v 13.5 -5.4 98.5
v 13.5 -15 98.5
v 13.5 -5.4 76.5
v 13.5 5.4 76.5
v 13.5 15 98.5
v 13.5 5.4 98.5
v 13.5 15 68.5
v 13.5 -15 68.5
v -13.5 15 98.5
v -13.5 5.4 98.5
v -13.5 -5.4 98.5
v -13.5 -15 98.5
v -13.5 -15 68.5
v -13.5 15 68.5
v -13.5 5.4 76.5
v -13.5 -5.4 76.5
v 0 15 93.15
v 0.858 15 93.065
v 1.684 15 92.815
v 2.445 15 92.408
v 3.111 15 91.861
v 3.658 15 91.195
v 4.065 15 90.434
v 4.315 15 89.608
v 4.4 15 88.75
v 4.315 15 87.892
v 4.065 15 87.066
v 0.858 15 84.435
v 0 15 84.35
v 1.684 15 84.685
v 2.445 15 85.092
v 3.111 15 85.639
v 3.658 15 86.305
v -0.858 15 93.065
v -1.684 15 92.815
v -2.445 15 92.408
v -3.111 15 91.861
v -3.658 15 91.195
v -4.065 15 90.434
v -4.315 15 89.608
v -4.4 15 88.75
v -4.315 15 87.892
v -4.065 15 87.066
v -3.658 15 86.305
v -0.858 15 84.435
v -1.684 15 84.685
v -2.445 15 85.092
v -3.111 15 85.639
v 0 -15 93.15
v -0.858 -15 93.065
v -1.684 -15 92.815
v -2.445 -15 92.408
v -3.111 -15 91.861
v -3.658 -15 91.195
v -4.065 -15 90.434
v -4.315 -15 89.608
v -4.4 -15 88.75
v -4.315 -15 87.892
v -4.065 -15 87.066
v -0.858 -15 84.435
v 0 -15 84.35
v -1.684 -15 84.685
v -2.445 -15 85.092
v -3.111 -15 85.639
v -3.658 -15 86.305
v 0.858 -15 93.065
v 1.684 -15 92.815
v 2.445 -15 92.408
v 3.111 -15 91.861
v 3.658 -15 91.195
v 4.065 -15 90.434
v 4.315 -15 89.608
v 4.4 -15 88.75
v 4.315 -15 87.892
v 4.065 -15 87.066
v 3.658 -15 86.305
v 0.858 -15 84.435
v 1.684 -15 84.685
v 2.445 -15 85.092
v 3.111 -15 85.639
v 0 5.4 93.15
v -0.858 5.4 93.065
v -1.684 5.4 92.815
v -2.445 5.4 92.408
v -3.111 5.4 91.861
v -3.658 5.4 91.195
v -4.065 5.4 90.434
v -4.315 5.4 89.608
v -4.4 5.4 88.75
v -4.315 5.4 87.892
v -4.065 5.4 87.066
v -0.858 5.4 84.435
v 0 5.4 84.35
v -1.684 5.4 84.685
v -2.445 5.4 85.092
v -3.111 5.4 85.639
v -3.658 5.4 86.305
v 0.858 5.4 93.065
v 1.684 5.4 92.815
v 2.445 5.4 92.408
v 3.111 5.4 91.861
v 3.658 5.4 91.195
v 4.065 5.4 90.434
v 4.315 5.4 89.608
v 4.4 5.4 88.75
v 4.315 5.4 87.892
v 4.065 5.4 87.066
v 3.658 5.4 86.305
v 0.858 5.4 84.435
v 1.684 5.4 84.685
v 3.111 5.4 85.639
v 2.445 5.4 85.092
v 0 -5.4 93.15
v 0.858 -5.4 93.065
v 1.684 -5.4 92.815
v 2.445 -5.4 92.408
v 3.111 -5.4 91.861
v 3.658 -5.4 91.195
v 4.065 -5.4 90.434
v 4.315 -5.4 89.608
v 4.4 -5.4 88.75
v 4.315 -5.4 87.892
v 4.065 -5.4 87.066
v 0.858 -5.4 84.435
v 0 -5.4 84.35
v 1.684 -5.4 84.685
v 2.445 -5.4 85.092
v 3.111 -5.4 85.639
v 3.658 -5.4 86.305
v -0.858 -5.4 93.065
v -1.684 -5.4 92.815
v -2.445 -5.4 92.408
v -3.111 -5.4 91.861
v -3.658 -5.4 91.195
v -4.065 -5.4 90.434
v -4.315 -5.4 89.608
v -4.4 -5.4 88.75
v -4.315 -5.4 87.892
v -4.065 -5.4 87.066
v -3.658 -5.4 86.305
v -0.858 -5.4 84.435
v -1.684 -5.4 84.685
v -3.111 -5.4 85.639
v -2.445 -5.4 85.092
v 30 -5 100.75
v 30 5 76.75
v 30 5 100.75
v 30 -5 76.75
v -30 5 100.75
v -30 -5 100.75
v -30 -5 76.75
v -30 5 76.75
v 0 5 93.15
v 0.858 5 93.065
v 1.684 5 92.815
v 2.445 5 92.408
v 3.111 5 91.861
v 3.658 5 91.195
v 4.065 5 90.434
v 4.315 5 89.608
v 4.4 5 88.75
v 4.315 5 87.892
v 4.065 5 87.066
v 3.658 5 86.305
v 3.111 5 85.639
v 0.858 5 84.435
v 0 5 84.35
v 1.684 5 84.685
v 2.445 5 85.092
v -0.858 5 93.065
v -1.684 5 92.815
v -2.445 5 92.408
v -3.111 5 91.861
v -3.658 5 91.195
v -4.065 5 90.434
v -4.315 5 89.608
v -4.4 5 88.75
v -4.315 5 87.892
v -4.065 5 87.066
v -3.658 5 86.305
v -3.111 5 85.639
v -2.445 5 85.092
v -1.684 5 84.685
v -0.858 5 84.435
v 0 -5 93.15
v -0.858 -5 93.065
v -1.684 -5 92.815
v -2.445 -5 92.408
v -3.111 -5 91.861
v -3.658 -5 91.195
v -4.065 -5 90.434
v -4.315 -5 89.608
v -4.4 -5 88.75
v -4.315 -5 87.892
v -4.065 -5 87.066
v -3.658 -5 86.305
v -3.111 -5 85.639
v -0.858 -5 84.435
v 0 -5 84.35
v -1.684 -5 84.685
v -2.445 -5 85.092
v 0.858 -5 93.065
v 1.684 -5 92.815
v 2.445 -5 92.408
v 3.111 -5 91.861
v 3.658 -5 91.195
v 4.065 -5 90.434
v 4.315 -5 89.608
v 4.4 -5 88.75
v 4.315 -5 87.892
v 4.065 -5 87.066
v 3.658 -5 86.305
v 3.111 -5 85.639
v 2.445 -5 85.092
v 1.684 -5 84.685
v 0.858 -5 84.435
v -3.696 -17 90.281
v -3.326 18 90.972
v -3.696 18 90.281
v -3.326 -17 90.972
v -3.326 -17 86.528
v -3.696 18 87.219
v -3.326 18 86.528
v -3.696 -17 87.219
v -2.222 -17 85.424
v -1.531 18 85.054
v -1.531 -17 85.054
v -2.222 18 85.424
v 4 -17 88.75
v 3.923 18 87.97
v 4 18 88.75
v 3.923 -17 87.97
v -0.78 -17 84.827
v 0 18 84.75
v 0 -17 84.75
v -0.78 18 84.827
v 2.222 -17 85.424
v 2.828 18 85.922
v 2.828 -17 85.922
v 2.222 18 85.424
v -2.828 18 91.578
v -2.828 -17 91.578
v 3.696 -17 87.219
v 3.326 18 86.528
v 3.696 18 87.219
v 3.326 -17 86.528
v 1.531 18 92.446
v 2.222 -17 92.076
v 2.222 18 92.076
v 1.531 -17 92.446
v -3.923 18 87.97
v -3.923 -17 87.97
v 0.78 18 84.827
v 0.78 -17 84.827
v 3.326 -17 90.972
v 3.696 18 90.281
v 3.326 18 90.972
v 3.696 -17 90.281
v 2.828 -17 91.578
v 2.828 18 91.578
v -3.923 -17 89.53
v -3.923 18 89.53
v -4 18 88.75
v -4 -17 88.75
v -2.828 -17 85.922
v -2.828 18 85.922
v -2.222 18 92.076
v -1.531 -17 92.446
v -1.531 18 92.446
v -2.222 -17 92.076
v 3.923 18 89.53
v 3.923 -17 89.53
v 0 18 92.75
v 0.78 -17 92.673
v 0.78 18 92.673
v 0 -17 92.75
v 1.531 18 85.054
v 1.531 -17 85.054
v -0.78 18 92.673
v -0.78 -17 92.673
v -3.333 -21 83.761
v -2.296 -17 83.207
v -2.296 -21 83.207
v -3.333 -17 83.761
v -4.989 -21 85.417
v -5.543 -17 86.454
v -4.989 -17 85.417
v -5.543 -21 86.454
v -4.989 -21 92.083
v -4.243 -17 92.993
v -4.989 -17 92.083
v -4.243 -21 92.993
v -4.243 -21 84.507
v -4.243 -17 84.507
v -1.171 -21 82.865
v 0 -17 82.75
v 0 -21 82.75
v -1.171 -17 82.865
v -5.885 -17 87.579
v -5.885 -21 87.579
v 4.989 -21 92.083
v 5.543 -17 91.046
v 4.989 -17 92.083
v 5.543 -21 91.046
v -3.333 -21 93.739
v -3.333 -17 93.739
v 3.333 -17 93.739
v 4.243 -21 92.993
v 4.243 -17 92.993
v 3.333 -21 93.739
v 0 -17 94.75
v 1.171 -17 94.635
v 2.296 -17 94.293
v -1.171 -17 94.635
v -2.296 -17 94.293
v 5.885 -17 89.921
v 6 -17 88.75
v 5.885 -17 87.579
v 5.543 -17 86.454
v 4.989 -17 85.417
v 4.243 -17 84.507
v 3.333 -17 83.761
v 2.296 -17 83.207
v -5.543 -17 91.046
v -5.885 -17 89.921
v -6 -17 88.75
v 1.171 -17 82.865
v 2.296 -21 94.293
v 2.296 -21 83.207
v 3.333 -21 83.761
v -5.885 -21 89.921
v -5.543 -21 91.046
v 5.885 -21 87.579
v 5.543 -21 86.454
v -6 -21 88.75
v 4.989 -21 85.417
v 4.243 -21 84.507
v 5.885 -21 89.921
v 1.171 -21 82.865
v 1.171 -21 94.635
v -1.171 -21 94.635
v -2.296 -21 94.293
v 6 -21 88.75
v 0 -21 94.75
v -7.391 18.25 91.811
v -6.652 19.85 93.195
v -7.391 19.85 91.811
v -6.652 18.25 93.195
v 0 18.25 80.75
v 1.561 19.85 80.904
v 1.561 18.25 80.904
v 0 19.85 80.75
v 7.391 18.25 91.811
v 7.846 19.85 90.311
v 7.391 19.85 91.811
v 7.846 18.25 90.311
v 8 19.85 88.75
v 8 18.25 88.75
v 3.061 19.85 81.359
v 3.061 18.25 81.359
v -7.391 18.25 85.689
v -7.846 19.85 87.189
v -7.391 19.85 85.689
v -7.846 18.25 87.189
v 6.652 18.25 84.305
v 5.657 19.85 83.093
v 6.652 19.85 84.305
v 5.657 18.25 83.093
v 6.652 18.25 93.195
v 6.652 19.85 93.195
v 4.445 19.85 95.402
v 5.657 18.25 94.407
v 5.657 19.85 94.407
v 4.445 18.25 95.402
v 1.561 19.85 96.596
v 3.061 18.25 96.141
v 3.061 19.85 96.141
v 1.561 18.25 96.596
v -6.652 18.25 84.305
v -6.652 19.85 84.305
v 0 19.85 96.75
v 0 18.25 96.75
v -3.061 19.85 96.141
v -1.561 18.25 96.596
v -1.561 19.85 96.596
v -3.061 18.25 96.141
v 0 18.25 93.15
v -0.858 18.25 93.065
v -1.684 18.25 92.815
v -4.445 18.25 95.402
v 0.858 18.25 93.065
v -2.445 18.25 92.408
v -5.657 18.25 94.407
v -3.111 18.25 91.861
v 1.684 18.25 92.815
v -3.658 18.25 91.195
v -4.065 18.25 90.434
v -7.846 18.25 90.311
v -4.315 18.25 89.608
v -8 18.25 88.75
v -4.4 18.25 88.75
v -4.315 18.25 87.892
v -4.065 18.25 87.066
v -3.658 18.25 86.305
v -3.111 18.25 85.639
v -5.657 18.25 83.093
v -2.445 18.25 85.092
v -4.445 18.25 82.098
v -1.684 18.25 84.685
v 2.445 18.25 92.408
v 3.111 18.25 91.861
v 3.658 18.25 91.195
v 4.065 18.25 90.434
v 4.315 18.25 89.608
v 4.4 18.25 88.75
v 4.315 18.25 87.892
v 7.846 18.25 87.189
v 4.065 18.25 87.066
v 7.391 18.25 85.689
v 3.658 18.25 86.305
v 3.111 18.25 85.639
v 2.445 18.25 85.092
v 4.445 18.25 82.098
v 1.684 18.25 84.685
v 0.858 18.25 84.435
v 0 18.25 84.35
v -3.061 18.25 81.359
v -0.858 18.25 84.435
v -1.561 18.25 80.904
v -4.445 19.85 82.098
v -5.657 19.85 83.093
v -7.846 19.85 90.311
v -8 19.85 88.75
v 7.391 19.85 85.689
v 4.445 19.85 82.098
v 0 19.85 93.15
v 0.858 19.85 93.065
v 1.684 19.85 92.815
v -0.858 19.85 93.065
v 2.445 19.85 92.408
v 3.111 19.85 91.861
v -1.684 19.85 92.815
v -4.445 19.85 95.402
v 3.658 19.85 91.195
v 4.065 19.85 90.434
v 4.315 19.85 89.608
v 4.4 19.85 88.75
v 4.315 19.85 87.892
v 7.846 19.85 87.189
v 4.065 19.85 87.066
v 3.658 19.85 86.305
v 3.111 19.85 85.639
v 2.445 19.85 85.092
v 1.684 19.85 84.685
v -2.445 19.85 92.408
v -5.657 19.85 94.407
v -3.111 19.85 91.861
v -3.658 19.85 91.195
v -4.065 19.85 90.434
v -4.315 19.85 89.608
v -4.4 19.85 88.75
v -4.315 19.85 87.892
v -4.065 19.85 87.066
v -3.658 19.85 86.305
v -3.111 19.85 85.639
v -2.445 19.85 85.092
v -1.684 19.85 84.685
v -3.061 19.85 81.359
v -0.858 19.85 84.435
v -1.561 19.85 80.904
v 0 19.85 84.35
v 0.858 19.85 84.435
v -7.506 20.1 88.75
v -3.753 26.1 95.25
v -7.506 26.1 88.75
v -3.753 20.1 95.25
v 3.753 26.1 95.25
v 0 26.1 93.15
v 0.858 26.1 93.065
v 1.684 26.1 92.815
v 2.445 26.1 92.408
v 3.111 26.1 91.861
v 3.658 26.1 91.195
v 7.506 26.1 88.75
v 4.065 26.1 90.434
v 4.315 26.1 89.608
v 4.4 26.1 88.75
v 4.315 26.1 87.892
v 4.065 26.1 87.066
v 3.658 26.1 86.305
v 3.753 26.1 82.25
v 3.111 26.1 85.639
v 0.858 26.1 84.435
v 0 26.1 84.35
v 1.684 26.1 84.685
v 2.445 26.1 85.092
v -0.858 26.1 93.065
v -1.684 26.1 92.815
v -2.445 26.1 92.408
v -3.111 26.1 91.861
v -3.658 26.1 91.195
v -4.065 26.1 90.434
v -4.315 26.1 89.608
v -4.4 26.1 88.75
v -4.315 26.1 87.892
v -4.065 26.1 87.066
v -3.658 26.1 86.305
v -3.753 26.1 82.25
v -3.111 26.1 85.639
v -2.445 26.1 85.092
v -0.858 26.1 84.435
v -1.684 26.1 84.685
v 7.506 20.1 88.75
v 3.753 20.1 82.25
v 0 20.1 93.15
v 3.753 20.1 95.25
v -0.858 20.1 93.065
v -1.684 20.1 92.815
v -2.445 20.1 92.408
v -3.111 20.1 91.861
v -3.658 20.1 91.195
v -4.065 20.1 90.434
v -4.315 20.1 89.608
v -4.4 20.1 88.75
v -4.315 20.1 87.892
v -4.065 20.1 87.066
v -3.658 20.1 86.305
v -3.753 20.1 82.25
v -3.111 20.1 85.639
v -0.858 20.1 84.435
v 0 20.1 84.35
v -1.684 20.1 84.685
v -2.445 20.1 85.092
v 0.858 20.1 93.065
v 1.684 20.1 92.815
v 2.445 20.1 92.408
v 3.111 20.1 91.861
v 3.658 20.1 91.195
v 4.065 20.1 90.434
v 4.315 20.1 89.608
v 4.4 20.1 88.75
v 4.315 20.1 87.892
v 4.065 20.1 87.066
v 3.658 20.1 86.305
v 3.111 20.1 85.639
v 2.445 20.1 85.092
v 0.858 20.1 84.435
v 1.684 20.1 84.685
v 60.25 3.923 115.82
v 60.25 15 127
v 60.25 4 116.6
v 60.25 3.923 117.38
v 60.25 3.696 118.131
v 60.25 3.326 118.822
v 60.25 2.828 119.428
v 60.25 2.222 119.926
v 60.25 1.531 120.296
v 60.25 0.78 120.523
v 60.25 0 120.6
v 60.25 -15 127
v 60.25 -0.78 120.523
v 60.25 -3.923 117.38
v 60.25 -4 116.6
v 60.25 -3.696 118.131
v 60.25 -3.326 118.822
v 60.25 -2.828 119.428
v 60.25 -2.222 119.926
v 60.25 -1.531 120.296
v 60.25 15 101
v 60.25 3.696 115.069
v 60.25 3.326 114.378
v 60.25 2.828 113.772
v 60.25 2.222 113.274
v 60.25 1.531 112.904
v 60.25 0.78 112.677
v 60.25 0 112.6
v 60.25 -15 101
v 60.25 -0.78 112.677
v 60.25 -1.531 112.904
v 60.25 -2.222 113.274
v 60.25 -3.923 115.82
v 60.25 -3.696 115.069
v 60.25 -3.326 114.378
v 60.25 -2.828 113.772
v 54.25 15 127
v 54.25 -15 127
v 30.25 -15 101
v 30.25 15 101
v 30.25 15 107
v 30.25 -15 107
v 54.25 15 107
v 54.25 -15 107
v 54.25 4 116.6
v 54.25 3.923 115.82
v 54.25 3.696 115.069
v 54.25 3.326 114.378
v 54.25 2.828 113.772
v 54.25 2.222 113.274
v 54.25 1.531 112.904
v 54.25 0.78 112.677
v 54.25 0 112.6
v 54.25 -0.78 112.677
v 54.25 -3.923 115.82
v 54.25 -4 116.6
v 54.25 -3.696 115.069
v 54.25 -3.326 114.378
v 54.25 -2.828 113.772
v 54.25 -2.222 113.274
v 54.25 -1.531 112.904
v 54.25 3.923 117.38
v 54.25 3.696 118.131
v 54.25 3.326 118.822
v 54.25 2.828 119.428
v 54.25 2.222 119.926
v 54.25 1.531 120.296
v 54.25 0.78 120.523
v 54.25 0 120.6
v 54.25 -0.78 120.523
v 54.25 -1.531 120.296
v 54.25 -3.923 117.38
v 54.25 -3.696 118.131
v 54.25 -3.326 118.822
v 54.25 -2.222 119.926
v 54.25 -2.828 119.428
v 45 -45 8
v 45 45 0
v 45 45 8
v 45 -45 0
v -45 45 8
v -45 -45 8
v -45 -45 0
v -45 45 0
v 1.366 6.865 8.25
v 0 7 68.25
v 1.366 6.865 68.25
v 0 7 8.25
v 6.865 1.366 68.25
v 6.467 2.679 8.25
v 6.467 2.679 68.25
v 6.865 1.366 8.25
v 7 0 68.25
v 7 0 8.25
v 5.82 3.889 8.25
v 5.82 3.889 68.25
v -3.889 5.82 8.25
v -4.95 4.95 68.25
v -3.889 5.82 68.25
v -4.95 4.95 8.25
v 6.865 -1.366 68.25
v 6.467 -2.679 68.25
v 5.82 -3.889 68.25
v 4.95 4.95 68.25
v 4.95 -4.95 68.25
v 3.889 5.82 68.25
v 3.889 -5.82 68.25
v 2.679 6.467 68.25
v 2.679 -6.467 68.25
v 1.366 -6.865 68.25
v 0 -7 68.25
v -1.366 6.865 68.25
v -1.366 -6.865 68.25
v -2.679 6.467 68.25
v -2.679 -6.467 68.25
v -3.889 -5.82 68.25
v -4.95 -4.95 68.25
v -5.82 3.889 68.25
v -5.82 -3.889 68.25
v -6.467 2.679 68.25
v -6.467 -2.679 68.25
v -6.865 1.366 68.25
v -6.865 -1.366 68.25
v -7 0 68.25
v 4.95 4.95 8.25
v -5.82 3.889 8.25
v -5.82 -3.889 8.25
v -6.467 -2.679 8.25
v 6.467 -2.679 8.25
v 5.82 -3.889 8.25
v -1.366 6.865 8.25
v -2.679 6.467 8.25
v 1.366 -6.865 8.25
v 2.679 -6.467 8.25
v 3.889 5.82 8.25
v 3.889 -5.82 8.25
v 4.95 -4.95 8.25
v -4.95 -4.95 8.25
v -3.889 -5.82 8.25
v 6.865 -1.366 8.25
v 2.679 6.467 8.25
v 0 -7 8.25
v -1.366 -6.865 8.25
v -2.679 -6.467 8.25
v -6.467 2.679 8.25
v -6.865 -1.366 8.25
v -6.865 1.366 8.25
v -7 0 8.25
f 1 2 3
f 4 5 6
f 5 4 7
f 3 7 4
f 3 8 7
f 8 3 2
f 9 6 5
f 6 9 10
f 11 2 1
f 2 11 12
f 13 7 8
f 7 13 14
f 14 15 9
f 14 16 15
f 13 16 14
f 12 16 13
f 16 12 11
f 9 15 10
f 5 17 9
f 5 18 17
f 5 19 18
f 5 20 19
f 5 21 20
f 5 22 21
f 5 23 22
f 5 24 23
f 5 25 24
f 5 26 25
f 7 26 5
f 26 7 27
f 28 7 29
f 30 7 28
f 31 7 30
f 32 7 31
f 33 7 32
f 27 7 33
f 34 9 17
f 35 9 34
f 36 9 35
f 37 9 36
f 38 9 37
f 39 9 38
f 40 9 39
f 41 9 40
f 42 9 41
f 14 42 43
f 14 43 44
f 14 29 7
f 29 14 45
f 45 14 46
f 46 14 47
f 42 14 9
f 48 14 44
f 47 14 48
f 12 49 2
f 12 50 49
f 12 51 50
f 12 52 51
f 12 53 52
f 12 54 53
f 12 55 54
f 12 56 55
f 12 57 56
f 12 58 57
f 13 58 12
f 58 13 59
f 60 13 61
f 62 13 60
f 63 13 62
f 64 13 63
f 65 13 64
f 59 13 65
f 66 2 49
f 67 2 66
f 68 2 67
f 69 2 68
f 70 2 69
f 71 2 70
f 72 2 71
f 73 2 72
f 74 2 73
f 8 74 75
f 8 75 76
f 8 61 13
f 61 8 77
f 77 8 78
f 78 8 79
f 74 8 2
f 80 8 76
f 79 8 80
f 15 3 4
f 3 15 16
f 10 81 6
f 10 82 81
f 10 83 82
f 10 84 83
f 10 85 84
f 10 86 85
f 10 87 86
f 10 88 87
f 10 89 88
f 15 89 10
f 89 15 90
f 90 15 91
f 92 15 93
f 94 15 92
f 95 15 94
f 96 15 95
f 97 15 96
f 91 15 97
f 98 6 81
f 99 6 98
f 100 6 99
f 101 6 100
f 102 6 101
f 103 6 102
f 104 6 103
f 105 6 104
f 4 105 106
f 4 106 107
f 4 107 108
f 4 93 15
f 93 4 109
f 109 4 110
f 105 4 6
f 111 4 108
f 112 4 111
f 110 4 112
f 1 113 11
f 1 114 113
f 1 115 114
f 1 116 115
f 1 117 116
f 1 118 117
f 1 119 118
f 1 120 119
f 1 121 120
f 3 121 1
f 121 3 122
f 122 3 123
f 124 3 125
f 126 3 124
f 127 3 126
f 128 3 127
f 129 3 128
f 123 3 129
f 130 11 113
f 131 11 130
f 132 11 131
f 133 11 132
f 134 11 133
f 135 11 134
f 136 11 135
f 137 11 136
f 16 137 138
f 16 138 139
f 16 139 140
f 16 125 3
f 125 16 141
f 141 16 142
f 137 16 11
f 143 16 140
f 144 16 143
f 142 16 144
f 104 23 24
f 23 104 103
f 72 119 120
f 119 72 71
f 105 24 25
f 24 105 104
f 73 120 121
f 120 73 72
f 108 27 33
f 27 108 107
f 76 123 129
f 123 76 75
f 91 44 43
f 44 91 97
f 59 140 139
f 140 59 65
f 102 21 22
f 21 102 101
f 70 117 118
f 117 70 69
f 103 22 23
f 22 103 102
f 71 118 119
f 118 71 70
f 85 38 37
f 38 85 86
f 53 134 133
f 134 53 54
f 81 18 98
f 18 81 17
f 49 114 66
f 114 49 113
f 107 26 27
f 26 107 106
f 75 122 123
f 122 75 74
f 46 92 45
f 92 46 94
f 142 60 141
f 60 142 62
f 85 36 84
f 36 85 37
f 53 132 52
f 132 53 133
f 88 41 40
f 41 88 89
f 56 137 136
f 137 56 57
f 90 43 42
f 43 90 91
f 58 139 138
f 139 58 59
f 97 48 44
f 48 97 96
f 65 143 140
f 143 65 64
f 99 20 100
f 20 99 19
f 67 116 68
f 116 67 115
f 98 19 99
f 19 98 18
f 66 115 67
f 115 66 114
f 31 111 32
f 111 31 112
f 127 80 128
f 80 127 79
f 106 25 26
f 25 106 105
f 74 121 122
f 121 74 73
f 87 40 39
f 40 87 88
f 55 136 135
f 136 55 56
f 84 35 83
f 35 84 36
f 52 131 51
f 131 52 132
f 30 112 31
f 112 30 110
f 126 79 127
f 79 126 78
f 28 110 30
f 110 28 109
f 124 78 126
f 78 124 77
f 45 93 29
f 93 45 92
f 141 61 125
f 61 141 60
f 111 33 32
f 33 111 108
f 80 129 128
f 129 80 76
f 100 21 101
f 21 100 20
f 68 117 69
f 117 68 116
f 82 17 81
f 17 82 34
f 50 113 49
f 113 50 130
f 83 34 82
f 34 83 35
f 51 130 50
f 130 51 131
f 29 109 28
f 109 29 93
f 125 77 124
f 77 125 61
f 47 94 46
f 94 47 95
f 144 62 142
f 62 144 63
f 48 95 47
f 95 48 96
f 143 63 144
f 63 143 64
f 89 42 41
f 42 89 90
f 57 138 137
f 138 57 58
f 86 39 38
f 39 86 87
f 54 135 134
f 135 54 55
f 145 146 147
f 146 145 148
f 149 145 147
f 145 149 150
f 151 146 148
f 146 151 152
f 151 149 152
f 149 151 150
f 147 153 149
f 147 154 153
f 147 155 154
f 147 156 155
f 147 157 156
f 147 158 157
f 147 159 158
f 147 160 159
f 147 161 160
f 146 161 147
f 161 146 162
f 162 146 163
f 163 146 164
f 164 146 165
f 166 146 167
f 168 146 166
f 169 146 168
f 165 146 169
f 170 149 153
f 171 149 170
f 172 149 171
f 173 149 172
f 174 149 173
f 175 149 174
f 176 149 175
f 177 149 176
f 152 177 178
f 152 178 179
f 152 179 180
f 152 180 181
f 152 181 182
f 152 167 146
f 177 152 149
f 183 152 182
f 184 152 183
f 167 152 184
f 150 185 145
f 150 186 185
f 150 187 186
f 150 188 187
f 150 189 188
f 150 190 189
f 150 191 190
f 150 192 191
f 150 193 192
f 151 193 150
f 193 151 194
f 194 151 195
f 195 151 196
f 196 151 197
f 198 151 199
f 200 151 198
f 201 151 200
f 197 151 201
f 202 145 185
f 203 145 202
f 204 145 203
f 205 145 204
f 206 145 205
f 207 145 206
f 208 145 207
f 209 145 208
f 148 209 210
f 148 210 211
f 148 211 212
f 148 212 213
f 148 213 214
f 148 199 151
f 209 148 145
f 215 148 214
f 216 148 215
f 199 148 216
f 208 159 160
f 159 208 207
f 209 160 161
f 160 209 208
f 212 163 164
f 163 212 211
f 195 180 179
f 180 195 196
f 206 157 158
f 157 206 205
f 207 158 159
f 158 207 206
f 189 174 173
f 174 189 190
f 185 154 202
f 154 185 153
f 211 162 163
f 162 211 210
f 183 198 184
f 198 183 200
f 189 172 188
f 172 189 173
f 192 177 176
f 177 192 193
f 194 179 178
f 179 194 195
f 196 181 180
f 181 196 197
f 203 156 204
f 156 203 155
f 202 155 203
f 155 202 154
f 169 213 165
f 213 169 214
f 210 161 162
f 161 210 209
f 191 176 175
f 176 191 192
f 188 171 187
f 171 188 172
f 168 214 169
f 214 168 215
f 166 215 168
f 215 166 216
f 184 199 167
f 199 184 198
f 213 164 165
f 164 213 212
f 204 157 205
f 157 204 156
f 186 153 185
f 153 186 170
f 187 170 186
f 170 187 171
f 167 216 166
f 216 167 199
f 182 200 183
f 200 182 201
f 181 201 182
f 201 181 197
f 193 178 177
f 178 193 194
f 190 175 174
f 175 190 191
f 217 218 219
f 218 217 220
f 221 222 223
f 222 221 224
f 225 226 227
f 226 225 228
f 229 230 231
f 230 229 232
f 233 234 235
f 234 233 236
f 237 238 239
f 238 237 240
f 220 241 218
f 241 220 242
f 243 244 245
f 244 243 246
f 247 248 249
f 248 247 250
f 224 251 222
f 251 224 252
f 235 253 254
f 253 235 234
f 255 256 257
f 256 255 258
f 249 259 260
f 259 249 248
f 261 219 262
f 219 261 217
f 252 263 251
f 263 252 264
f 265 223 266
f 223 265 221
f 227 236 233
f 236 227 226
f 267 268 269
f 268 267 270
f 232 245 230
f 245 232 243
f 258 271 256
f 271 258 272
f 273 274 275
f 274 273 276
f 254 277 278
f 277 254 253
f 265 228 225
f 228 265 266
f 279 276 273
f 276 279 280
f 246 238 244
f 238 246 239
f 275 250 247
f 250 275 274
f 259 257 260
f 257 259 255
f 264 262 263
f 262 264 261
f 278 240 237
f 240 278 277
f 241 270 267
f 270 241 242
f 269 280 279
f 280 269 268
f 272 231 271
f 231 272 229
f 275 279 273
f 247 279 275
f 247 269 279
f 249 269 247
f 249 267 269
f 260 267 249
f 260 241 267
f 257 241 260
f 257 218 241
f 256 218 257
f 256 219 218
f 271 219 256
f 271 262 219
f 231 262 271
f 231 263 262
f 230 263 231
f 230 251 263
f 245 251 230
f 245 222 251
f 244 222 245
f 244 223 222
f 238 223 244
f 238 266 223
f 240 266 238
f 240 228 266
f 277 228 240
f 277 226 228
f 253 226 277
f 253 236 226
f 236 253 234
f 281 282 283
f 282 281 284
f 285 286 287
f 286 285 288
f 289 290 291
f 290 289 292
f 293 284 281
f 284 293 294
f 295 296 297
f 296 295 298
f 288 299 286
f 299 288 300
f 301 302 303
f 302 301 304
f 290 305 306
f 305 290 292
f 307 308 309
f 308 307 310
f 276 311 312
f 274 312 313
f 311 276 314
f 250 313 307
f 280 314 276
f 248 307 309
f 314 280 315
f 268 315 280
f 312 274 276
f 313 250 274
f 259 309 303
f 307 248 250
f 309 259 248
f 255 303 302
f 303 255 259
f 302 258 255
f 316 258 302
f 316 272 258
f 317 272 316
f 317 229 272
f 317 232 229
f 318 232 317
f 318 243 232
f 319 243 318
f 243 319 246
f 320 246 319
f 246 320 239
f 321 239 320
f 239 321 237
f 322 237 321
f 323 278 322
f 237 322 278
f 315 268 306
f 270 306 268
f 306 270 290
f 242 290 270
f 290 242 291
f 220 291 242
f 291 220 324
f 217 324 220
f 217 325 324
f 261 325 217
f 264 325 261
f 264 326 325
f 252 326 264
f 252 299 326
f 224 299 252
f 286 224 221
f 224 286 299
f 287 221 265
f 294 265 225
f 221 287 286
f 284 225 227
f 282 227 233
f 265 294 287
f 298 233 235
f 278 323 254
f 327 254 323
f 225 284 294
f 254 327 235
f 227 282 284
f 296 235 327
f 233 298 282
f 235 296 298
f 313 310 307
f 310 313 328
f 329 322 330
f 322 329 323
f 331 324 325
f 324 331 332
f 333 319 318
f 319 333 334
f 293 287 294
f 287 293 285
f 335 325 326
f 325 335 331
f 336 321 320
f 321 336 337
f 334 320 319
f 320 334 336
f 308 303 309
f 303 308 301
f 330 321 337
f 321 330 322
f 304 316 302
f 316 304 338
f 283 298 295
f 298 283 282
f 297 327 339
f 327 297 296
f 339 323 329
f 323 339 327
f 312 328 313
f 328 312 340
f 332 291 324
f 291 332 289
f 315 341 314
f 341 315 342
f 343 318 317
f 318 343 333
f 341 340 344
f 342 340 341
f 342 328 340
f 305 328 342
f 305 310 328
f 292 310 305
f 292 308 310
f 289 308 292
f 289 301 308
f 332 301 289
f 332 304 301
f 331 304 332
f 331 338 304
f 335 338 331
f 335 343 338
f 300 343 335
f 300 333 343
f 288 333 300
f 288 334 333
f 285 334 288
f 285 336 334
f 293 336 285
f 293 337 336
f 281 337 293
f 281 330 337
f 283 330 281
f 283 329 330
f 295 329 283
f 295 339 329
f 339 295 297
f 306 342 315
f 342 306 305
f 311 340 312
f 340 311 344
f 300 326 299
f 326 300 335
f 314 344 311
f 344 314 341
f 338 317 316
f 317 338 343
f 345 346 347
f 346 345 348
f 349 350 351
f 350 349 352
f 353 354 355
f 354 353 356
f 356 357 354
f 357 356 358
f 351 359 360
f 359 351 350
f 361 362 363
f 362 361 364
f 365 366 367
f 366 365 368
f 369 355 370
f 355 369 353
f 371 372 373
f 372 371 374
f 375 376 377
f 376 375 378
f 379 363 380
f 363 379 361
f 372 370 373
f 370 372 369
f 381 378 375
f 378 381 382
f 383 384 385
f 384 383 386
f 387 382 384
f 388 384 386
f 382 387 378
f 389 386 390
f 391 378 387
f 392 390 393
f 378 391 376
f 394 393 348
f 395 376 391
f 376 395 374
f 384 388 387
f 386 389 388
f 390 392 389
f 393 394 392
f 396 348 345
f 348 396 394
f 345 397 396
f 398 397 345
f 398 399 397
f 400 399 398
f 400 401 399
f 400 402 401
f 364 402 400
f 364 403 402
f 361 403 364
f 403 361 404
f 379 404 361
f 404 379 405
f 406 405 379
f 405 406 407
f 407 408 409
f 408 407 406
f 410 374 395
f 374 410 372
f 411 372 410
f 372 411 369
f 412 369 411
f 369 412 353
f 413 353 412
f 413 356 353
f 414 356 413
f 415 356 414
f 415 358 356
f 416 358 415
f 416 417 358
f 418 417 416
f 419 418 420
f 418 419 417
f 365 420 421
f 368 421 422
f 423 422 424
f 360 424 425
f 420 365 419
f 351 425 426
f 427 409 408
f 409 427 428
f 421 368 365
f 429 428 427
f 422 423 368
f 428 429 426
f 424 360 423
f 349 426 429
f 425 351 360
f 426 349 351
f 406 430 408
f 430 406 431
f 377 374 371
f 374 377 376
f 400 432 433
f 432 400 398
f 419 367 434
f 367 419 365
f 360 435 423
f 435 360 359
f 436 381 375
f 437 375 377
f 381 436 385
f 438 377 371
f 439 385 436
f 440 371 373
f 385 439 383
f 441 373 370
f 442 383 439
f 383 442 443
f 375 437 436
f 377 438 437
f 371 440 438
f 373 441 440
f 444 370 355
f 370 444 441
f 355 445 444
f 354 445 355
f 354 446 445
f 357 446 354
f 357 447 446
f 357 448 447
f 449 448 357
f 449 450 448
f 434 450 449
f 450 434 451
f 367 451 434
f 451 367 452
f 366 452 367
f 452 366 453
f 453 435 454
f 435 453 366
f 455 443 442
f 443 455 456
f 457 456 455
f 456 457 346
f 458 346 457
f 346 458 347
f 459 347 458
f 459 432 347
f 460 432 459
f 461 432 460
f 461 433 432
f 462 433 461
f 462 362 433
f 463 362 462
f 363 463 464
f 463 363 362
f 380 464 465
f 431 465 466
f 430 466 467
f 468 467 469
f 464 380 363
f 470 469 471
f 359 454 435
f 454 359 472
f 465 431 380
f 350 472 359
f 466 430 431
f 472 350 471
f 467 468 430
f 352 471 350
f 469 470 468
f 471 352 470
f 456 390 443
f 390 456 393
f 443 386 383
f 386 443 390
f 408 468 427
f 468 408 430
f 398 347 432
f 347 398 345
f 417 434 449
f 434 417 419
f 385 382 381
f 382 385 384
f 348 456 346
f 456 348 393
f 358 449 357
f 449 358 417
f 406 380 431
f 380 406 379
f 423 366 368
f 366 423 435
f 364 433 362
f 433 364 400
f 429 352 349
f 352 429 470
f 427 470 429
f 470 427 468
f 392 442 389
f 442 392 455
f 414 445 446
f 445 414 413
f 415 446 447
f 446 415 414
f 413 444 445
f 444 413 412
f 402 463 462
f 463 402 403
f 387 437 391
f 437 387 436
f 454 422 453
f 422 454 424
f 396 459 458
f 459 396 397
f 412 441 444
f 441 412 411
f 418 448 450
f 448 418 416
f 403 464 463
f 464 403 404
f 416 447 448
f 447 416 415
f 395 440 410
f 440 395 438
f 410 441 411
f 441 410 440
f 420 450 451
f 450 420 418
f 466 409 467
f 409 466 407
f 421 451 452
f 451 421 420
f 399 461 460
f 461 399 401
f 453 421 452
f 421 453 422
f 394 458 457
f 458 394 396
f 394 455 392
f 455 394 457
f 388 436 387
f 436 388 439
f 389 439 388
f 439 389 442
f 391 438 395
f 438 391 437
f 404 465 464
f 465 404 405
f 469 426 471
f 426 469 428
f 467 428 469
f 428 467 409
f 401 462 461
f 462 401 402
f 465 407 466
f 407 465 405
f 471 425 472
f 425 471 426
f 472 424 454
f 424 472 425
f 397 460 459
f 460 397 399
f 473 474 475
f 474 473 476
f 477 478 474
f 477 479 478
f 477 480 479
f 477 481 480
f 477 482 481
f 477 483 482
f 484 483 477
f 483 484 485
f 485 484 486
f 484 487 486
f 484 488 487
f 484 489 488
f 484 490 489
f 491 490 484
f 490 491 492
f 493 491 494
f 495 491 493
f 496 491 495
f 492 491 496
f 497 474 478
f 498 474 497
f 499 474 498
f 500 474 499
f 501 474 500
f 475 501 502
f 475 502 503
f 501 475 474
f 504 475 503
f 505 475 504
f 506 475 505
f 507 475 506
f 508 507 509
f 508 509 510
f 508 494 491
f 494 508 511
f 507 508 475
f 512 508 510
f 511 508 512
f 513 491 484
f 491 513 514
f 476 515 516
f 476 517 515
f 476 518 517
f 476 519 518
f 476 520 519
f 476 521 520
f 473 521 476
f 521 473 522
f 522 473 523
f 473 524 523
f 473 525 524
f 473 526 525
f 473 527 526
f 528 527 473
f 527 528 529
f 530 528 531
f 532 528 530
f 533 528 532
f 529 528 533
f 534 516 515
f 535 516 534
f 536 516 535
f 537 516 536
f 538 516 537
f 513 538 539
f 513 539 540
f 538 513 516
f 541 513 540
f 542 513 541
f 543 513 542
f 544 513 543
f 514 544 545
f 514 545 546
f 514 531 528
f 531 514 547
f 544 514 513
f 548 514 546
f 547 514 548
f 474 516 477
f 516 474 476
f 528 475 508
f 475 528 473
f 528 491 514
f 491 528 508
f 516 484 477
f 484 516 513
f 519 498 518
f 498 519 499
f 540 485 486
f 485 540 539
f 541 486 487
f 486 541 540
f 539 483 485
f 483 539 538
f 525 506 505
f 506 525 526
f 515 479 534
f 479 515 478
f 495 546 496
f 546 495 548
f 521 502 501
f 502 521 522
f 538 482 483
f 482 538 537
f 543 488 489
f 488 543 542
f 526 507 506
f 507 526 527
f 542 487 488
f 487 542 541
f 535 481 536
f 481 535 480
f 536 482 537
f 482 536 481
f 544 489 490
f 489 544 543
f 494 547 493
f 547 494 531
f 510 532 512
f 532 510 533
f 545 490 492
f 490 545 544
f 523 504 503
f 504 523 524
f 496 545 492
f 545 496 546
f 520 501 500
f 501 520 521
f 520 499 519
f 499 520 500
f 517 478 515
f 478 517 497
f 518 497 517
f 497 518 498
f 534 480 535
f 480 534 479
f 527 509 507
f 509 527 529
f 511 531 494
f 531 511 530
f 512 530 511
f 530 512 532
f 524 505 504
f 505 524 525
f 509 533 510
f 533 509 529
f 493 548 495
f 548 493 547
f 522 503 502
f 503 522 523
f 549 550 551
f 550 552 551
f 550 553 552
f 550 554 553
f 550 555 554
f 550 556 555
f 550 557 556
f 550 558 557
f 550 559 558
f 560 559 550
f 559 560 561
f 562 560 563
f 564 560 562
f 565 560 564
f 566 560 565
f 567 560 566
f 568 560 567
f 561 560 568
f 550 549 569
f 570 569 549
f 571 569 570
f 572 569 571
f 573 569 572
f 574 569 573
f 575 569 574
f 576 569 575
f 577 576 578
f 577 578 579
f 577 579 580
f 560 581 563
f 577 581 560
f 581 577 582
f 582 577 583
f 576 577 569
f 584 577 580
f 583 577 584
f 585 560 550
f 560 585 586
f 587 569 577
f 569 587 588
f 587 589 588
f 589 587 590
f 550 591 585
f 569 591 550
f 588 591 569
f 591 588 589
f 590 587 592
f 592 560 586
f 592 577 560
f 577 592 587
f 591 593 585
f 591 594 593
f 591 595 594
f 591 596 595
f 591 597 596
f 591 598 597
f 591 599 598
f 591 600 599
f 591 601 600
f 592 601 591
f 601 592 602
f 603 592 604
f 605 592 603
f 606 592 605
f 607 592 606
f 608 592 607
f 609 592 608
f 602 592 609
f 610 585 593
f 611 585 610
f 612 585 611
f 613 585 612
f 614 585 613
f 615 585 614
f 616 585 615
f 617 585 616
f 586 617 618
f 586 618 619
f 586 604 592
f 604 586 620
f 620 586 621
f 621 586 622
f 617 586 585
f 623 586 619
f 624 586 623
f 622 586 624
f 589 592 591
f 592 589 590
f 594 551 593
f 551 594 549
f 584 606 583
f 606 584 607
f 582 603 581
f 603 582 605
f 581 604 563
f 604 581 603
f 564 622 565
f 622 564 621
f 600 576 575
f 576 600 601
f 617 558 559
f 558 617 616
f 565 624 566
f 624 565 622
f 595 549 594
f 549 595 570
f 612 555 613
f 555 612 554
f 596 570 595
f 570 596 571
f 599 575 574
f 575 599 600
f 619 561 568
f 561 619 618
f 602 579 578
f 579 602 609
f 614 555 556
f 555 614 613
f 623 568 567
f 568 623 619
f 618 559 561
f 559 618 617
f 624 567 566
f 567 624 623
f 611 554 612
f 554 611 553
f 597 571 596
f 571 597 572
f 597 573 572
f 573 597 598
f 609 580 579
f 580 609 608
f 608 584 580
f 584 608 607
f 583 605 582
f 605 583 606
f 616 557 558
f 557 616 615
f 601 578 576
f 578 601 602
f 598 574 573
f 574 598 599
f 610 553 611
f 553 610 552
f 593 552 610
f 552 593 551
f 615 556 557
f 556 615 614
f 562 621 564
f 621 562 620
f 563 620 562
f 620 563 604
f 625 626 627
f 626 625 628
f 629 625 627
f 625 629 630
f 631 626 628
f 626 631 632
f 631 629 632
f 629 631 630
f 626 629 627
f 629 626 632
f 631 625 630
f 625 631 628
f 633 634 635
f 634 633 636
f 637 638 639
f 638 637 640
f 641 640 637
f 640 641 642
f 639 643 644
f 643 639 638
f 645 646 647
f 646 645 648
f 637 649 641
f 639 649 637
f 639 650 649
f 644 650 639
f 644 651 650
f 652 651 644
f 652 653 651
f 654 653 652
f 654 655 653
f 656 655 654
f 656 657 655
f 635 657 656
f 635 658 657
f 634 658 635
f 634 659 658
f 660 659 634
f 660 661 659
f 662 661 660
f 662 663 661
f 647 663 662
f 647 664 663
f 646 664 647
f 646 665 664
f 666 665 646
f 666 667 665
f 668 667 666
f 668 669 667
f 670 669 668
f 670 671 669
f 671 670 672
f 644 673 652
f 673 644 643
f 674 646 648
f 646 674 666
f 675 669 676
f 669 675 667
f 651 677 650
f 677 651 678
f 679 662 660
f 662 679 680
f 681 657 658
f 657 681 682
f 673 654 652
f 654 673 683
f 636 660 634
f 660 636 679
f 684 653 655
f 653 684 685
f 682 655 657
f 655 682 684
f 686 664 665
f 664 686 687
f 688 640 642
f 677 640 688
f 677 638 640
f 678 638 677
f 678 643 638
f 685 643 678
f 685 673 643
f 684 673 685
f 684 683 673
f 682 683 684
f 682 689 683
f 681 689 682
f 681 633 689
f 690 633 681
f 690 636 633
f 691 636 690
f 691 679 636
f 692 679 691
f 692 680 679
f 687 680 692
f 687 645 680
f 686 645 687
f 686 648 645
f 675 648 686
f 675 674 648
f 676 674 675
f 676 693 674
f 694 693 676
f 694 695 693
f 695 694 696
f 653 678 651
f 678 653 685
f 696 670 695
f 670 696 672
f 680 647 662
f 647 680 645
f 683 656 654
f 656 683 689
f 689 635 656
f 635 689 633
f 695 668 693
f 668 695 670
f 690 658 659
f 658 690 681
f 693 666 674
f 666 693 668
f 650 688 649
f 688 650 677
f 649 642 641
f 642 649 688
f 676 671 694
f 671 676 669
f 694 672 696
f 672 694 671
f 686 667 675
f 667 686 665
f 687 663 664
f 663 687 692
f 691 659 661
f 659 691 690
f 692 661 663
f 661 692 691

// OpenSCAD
$fn = 32;

// ------------------------------------------------------------------------
// Lamp arm: column d14 x 60 mm, arm 60 mm
// Every part is its own module, assembly() places every instance.
// ------------------------------------------------------------------------

// --- part 1 ---
module lamp_base() {
  difference() {
    translate([-45, -45, 0]) cube([90, 90, 8]);
  }
}

// --- part 2 ---
module lamp_column() {
  cylinder(h = 60, d = 14);
}

// --- part 3 ---
module head_fork() {
  difference() {
    translate([-13.5, -15, 0]) cube([27, 30, 30]);
    translate([-14.5, -5.4, 8]) cube([29, 10.8, 23]);
    translate([0, 0, 20.25]) rotate([90, 0, 0]) cylinder(h = 32, d = 8.8, center = true);
  }
}

// --- part 4 ---
module lamp_arm() {
  difference() {
    translate([-30, -5, 0]) cube([60, 10, 24]);
    translate([0, 0, 12]) rotate([90, 0, 0]) cylinder(h = 12, d = 8.8, center = true);
  }
}

// --- part 5 ---
module arm_pin() {
  rotate([0, 90, 0]) cylinder(h = 36, d = 8, center = true);
  translate([-21, 0, 0]) rotate([0, 90, 0]) cylinder(h = 4, d = 12);
}

// --- part 6 ---
module arm_washer() {
  difference() {
      translate([0, 0, 0]) cylinder(h = 1.6, d = 16);
      translate([0, 0, -1]) cylinder(h = 3.6, d = 8.8);
    }
}

// --- part 7 ---
module arm_nut() {
  difference() {
    linear_extrude(height = 6) polygon(points = [[7.506, 0], [3.753, 6.5], [-3.753, 6.5], [-7.506, 0], [-3.753, -6.5], [3.753, -6.5]]);
    translate([0, 0, -1]) cylinder(h = 8, d = 8.8);
  }
}

// --- part 8 ---
module shade_bracket() {
  difference() {
    translate([-15, -15, 0]) cube([30, 30, 26]);
    translate([-16, -16, 6]) cube([25, 32, 21]);
    translate([12, 0, 15.6]) rotate([0, 90, 0]) cylinder(h = 8, d = 8, center = true);
  }
}

// --- assembly ---
module assembly() {
  color([0.80, 0.24, 0.20]) translate([0, 0, 0]) rotate([0, 0, 0]) lamp_base();
  color([0.20, 0.45, 0.75]) translate([0, 0, 8.25]) rotate([0, 0, 0]) lamp_column();
  color([0.25, 0.62, 0.32]) translate([0, 0, 68.5]) rotate([0, 0, 0]) head_fork();
  color([0.92, 0.70, 0.18]) translate([0, 0, 76.75]) rotate([0, 0, 0]) lamp_arm();
  color([0.58, 0.35, 0.70]) translate([0, 0, 88.75]) rotate([0, 0, 90]) arm_pin();
  color([0.16, 0.66, 0.66]) translate([0, 19.85, 88.75]) rotate([90, 0, 0]) arm_washer();
  color([0.85, 0.48, 0.18]) translate([0, 26.1, 88.75]) rotate([90, 0, 0]) arm_nut();
  color([0.55, 0.60, 0.65]) translate([45.25, 0, 101]) rotate([0, 0, 0]) shade_bracket();
}

assembly();
